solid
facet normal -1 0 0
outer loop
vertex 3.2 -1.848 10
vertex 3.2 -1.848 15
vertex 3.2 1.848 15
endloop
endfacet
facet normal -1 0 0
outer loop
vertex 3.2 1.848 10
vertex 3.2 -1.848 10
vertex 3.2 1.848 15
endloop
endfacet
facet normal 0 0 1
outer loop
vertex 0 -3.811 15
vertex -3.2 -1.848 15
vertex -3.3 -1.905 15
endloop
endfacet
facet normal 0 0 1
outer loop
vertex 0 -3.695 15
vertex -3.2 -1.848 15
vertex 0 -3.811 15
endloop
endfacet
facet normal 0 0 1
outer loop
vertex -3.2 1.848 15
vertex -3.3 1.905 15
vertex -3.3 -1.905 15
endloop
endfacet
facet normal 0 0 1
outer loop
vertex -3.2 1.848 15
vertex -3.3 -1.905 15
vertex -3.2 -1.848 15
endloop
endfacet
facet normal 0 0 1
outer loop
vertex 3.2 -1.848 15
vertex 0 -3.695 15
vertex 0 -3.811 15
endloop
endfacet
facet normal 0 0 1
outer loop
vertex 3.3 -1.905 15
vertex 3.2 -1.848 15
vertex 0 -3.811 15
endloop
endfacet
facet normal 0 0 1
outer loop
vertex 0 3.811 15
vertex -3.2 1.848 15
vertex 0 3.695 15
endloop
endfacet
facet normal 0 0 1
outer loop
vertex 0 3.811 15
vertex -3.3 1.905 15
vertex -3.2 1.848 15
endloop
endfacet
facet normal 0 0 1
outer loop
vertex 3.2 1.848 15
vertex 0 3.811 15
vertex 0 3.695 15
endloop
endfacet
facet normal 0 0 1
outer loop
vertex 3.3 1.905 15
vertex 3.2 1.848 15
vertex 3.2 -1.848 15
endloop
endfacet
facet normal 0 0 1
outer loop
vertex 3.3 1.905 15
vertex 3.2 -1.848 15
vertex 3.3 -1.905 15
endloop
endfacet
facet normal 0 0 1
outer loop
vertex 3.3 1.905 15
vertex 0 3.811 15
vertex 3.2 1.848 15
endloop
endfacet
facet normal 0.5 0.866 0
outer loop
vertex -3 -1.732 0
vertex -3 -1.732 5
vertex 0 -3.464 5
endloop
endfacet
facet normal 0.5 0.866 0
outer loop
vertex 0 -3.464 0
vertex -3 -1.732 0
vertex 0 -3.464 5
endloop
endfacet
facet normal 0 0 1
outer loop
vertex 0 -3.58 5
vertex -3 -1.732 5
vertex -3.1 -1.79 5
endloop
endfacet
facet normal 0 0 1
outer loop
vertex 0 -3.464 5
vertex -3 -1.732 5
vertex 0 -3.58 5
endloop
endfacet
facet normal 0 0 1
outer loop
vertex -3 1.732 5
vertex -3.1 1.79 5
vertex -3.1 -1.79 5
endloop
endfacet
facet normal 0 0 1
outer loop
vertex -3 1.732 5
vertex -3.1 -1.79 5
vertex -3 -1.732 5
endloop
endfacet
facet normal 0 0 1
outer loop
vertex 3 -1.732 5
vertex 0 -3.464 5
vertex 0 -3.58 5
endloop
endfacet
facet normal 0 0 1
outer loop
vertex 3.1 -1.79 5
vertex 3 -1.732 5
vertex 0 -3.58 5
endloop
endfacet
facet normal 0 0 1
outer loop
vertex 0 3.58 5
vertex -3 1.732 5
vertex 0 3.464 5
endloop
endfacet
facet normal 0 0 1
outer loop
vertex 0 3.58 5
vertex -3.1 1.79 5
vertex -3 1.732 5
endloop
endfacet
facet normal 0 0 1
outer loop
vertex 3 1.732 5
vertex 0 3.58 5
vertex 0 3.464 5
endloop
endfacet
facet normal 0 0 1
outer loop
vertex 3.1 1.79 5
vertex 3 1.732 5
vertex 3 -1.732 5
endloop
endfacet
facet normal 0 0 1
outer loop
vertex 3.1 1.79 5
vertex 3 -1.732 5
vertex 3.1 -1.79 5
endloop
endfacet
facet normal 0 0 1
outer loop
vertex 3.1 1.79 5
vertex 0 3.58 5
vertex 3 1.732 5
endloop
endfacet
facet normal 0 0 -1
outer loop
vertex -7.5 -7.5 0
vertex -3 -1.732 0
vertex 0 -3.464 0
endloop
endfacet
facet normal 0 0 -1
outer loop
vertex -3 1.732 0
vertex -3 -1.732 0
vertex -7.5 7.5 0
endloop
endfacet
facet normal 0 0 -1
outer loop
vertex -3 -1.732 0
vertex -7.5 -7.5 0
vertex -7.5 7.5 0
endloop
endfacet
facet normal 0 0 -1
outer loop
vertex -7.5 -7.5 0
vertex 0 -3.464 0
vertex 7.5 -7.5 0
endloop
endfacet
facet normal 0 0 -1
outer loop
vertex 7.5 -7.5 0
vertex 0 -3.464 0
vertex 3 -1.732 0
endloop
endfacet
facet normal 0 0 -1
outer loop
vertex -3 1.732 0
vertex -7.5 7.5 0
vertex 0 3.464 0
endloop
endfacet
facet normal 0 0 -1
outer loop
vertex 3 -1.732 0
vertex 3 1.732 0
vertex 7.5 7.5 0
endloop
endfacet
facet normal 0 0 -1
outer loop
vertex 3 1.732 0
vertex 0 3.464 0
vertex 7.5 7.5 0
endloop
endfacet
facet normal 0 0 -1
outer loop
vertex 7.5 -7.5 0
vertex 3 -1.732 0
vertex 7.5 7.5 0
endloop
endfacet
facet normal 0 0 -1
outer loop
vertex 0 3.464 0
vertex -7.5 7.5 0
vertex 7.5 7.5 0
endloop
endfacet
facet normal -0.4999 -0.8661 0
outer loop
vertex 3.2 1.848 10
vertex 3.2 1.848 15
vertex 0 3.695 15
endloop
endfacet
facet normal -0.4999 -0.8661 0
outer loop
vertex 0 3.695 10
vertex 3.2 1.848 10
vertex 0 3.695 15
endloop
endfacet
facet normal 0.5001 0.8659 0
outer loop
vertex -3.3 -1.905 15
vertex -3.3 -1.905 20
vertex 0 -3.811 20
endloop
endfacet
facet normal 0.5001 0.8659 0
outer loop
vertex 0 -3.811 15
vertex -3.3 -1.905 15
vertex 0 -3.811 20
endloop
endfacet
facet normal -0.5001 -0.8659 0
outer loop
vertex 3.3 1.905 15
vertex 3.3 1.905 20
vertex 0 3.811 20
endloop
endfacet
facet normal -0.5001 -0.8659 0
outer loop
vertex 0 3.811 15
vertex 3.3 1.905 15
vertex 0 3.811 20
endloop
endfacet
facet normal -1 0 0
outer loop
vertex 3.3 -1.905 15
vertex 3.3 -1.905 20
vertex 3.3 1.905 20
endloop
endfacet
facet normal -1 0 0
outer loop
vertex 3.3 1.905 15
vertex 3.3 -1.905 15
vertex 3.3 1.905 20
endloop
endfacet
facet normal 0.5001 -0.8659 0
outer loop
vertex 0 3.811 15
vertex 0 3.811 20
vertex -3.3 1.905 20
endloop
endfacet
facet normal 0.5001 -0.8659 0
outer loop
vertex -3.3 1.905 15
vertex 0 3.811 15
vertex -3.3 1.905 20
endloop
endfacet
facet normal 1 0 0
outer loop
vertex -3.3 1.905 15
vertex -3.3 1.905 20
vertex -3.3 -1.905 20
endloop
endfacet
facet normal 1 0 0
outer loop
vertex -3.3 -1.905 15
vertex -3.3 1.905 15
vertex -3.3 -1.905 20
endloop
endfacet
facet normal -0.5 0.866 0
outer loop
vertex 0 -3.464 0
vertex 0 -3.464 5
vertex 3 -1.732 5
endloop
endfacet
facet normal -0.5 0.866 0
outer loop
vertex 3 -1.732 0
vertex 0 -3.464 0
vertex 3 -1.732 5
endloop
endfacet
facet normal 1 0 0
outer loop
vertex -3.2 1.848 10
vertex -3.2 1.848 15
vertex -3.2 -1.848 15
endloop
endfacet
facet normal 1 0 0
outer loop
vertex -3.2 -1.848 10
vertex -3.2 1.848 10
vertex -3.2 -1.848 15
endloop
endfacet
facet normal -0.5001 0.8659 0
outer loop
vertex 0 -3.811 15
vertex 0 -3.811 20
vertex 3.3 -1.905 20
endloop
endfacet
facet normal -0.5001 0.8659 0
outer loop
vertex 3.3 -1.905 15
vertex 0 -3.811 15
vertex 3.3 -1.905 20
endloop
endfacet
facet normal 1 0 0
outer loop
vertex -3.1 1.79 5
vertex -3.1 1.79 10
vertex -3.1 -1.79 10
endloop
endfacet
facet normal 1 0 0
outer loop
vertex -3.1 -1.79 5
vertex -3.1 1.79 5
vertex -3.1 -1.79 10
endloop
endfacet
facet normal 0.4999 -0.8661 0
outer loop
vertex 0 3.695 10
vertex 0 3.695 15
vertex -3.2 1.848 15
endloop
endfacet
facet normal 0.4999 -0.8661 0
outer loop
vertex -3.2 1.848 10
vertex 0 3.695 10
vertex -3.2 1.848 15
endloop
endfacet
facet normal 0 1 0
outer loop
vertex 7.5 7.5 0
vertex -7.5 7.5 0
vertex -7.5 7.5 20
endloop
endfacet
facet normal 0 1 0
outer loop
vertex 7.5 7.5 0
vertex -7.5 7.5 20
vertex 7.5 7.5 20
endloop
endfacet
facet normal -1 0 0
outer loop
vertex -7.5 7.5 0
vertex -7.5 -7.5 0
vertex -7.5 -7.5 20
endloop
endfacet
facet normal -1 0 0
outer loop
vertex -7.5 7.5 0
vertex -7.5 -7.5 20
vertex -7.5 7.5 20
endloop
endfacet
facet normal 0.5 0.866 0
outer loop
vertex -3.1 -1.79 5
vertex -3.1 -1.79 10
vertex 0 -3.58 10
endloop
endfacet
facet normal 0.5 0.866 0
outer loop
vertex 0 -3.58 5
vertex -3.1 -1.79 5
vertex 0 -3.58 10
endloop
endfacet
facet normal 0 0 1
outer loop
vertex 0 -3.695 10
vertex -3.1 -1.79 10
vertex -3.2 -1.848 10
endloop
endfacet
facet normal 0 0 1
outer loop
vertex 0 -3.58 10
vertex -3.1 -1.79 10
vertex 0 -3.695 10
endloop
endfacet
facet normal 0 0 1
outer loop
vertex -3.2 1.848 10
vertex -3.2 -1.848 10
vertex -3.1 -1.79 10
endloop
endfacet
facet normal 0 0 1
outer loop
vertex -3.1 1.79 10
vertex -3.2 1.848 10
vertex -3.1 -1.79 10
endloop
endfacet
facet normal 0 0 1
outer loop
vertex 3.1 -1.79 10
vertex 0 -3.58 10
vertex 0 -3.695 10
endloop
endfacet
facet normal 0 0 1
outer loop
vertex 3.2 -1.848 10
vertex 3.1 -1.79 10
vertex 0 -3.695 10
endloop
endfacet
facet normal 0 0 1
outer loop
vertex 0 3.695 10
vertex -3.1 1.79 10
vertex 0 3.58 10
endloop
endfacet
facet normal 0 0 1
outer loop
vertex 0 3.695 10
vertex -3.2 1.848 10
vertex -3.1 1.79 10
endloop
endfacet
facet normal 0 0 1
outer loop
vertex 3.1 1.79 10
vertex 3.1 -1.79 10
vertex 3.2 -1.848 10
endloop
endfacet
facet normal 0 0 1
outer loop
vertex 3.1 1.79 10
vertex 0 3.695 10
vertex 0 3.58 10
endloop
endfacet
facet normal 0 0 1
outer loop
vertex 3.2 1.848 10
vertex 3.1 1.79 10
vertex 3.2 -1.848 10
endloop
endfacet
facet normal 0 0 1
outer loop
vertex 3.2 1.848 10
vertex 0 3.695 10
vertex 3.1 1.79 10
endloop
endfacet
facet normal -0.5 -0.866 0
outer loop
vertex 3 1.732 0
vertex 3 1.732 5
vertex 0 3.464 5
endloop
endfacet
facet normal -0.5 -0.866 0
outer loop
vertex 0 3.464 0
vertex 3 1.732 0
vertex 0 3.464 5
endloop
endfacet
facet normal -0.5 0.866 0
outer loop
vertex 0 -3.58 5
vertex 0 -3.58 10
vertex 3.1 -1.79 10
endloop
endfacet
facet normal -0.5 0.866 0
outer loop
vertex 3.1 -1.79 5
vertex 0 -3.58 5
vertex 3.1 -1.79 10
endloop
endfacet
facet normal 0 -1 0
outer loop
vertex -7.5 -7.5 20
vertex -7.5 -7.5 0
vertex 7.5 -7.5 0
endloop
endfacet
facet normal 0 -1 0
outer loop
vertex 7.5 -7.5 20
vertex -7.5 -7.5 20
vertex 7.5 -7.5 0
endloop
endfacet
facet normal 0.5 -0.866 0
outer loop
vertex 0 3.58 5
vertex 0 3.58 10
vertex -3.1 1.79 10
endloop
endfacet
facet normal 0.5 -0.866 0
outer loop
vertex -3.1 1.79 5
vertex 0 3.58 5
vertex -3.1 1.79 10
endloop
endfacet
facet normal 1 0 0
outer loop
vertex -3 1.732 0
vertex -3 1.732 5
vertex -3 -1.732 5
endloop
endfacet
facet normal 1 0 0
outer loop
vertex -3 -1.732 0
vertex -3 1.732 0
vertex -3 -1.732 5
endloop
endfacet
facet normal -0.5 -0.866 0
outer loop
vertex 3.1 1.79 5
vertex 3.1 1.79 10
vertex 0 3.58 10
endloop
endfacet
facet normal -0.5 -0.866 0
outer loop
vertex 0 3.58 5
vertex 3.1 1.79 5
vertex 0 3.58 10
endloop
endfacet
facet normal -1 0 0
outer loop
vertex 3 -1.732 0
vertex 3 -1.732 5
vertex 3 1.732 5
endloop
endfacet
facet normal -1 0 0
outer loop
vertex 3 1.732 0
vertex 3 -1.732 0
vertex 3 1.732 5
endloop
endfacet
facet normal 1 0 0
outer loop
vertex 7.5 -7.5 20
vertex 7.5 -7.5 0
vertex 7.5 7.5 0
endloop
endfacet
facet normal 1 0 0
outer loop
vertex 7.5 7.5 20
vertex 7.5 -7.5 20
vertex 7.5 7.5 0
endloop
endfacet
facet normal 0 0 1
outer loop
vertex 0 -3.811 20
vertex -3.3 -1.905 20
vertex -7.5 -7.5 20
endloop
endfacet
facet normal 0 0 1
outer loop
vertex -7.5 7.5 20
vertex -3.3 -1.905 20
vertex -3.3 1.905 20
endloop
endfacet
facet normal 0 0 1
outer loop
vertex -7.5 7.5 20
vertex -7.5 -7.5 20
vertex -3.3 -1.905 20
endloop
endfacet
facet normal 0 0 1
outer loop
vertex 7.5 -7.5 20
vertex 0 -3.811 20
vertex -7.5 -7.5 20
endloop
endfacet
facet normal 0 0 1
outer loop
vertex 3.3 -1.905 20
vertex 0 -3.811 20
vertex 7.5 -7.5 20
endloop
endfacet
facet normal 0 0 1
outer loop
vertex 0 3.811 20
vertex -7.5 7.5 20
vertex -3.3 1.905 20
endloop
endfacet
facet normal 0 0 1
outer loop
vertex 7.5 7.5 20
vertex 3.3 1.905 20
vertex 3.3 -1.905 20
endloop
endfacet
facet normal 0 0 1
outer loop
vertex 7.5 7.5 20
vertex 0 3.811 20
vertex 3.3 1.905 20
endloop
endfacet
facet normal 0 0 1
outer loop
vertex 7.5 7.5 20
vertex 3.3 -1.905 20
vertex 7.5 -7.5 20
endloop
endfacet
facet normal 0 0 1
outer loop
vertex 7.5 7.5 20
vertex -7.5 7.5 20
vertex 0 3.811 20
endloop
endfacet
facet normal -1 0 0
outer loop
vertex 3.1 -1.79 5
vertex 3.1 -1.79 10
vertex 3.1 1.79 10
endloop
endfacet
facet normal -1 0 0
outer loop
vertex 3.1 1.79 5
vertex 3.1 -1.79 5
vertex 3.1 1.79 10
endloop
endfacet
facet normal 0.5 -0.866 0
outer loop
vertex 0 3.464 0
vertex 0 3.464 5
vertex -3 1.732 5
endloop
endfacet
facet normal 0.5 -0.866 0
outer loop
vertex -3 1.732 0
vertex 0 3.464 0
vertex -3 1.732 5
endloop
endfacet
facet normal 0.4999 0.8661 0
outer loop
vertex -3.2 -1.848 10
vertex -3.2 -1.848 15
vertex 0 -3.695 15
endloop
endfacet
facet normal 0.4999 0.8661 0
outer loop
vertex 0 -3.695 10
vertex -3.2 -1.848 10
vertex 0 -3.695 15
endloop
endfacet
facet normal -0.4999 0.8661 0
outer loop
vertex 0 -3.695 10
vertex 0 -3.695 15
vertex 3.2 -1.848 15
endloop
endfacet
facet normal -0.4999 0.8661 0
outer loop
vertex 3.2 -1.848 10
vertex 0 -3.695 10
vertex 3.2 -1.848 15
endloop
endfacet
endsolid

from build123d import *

# Parameters (mm, degrees)
F0_W     = 15
F0_H     = 15
F1_DEPTH = 20
F3_DEPTH = 5
F5_DEPTH = 5
F7_DEPTH = 5
F9_DEPTH = 5


with BuildPart() as f1:
    # F0 (on Top) → F1 (new body)
    with BuildSketch(Plane.XY):
        Rectangle(F0_W, F0_H)
    extrude(amount=F1_DEPTH)

    # F2 (on face) → F3 (cut)
    with BuildSketch(Plane.XY.offset(20)):
        Polygon((3.3, -1.905256), (3.3, 1.905256), (0, 3.810512), (-3.3, 1.905256), (-3.3, -1.905256), (0, -3.810512), align=None)
    extrude(amount=-F3_DEPTH, mode=Mode.SUBTRACT)

    # F4 (on face) → F5 (cut)
    with BuildSketch(Plane.XY.offset(15)):
        Polygon((3.2, -1.847521), (3.2, 1.847521), (0, 3.695042), (-3.2, 1.847521), (-3.2, -1.847521), (0, -3.695042), align=None)
    extrude(amount=-F5_DEPTH, mode=Mode.SUBTRACT)

    # F6 (on face) → F7 (cut)
    with BuildSketch(Plane.XY.offset(10)):
        Polygon((3.1, -1.789786), (3.1, 1.789786), (0, 3.579572), (-3.1, 1.789786), (-3.1, -1.789786), (0, -3.579572), align=None)
    extrude(amount=-F7_DEPTH, mode=Mode.SUBTRACT)

    # F8 (on face) → F9 (cut)
    with BuildSketch(Plane.XY.offset(5)):
        Polygon((3, -1.732051), (3, 1.732051), (0, 3.464102), (-3, 1.732051), (-3, -1.732051), (0, -3.464102), align=None)
    extrude(amount=-F9_DEPTH, mode=Mode.SUBTRACT)


solid = f1.part
